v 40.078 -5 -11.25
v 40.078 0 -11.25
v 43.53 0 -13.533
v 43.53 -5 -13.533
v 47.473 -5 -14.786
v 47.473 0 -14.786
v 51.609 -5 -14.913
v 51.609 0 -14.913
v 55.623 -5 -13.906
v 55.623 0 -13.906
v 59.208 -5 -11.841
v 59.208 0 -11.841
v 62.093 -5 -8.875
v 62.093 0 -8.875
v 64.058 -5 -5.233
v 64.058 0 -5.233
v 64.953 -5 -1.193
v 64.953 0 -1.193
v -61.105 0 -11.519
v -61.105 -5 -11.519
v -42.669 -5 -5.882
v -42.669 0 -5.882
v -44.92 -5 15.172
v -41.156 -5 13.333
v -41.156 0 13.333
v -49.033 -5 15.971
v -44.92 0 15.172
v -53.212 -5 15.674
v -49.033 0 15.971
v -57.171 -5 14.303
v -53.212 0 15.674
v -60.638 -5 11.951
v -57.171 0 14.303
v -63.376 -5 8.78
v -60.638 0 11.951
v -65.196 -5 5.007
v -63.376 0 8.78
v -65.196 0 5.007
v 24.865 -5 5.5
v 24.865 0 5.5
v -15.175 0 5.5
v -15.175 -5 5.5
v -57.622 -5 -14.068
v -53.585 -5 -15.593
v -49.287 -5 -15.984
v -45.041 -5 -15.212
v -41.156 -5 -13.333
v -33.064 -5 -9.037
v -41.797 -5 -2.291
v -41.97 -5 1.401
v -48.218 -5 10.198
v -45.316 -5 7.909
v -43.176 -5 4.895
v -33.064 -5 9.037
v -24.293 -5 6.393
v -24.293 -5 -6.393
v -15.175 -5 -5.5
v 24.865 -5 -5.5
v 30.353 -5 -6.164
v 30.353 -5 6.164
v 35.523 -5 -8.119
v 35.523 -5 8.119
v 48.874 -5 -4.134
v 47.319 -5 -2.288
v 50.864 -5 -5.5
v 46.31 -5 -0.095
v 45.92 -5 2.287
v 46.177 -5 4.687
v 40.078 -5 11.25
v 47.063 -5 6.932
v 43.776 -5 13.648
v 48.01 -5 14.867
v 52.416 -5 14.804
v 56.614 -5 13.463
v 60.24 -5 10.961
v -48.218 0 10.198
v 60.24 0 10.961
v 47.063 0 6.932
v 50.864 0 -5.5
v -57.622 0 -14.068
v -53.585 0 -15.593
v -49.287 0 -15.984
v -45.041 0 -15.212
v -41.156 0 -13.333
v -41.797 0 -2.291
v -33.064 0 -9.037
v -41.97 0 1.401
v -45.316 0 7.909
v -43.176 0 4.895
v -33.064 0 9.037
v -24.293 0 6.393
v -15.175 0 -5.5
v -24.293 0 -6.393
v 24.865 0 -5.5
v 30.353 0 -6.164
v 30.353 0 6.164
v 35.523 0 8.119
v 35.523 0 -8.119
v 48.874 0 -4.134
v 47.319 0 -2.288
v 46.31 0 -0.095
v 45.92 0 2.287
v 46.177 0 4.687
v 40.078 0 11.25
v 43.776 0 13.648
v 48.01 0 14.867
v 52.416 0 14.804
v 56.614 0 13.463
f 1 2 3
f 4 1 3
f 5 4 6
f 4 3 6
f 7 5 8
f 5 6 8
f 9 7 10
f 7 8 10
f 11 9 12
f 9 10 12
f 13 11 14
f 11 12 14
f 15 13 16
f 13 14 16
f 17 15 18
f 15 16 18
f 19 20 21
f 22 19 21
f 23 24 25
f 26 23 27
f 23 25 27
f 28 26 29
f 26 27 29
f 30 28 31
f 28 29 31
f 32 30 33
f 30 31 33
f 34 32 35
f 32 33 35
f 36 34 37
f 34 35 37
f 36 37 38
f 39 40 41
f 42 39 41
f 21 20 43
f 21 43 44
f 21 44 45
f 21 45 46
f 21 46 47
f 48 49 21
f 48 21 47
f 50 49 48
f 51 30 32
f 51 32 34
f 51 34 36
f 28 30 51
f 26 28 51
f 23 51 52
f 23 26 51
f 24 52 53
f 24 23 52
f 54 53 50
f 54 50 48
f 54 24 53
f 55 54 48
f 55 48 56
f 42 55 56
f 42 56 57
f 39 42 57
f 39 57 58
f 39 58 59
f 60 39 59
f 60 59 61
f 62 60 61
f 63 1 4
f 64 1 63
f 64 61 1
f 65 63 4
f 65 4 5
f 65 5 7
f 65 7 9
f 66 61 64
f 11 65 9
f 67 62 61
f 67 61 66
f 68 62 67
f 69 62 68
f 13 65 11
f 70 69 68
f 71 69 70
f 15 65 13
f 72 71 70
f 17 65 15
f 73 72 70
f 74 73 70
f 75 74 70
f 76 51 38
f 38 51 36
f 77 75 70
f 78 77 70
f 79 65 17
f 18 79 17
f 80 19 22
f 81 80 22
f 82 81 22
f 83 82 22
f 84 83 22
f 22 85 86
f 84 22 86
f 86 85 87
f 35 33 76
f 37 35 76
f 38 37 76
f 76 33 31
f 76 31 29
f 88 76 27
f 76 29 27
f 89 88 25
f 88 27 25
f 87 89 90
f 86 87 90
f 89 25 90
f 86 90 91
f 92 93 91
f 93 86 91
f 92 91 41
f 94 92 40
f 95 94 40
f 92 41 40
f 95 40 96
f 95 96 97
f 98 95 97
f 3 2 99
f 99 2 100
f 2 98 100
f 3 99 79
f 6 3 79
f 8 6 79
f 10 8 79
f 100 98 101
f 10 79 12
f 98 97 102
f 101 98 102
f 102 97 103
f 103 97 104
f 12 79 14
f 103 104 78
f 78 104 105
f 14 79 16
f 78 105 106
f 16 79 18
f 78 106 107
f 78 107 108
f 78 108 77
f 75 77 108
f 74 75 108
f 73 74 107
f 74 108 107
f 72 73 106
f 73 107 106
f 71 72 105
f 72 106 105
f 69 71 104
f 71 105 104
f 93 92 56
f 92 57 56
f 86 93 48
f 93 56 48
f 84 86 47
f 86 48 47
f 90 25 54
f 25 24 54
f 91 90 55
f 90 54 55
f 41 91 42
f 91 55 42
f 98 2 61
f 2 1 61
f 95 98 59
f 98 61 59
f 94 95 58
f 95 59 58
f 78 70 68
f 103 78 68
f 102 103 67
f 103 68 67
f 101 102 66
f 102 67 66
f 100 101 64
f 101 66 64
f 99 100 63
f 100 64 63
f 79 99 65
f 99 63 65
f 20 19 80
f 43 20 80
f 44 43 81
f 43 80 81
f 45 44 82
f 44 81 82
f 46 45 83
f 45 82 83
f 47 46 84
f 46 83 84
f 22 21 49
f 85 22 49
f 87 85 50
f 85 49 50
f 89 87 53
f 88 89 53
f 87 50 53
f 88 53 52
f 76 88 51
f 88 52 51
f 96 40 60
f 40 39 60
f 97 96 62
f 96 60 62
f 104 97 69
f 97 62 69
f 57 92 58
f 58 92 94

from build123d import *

# Parameters (mm, degrees)
F1_DEPTH = 5
F3_DEPTH = 25
F4_R     = 47
F5_R     = 23
F7_DEPTH = 25


with BuildPart() as f1:
    # F0 (on Front) → F1 (new body)
    with BuildSketch(Plane.XZ):
        with BuildLine():
            Line((-50, -5.5), (-50, 5.5))
            Line((-50, 5.5), (-34.9750207987, 5.5))
            ThreePointArc((-34.9750207987, 5.5), (-66, 0), (-34.9750207987, -5.5))
            Line((-34.9750207987, -5.5), (-50, -5.5))
        make_face()
        with BuildLine():
            Line((-34.9750207987, 5.5), (-50, 5.5))
            Line((-50, 5.5), (-50, -5.5))
            Line((-50, -5.5), (-34.9750207987, -5.5))
            ThreePointArc((-34.9750207987, -5.5), (-34.2456408061, -2.7928777971), (-34, 0))
            ThreePointArc((-34, 0), (-34.2456408061, 2.7928777971), (-34.9750207987, 5.5))
        make_face()
        with BuildLine():
            Line((36.044714263, 5.5), (-34.9750207987, 5.5))
            ThreePointArc((-34.9750207987, 5.5), (-34.2456408061, 2.7928777971), (-34, 0))
            ThreePointArc((-34, 0), (-34.2456408061, -2.7928777971), (-34.9750207987, -5.5))
            Line((-34.9750207987, -5.5), (36.044714263, -5.5))
            ThreePointArc((36.044714263, -5.5), (35, 0), (36.044714263, 5.5))
        make_face()
        with BuildLine():
            ThreePointArc((65, 0), (52.7991707652, 14.7365071515), (36.044714263, 5.5))
            Line((36.044714263, 5.5), (50, 5.5))
            Line((50, 5.5), (50, -5.5))
            Line((50, -5.5), (36.044714263, -5.5))
            ThreePointArc((36.044714263, -5.5), (52.7991707652, -14.7365071515), (65, 0))
        make_face()
        with BuildLine():
            Line((50, 5.5), (36.044714263, 5.5))
            ThreePointArc((36.044714263, 5.5), (35, 0), (36.044714263, -5.5))
            Line((36.044714263, -5.5), (50, -5.5))
            Line((50, -5.5), (50, 5.5))
        make_face()
    extrude(amount=F1_DEPTH)

    # F2 (on face) → F3 (cut)
    with BuildSketch(Plane.XZ.offset(5)):
        with BuildLine():
            Line((-95.8441084985, -22.139607746), (-42.6692659416, -5.8824268946))
            ThreePointArc((-42.6692659416, -5.8824268946), (-42.4482601938, 3.1912614483), (-48.2176659008, 10.1980168652))
            Line((-48.2176659008, 10.1980168652), (-100.8144274788, -5.8824268946))
            Line((-100.8144274788, -5.8824268946), (-95.8441084985, -22.139607746))
        make_face()
    extrude(amount=-F3_DEPTH, mode=Mode.SUBTRACT)

    # F4
    f4_edges = [f1.edges().sort_by_distance(p)[0] for p in [
        (-34.975021, -2.5, 5.5),
        (-34.975021, -2.5, -5.5),
    ]]
    fillet(f4_edges, radius=F4_R)

    # F5
    f5_edges = [f1.edges().sort_by_distance(p)[0] for p in [
        (36.044714, -2.5, -5.5),
        (36.044714, -2.5, 5.5),
    ]]
    fillet(f5_edges, radius=F5_R)

    # F6 (on face) → F7 (cut)
    with BuildSketch(Plane.XZ.offset(5)):
        with BuildLine():
            Line((72.8835861022, 14.825997855), (47.0633576912, 6.9319618275))
            ThreePointArc((47.0633576912, 6.9319618275), (46.3099800667, -0.0953652442), (50.8641898526, -5.5))
            Line((50.8641898526, -5.5), (76.6844182636, 2.3940360275))
            Line((76.6844182636, 2.3940360275), (72.8835861022, 14.825997855))
        make_face()
    extrude(amount=-F7_DEPTH, mode=Mode.SUBTRACT)


solid = f1.part
